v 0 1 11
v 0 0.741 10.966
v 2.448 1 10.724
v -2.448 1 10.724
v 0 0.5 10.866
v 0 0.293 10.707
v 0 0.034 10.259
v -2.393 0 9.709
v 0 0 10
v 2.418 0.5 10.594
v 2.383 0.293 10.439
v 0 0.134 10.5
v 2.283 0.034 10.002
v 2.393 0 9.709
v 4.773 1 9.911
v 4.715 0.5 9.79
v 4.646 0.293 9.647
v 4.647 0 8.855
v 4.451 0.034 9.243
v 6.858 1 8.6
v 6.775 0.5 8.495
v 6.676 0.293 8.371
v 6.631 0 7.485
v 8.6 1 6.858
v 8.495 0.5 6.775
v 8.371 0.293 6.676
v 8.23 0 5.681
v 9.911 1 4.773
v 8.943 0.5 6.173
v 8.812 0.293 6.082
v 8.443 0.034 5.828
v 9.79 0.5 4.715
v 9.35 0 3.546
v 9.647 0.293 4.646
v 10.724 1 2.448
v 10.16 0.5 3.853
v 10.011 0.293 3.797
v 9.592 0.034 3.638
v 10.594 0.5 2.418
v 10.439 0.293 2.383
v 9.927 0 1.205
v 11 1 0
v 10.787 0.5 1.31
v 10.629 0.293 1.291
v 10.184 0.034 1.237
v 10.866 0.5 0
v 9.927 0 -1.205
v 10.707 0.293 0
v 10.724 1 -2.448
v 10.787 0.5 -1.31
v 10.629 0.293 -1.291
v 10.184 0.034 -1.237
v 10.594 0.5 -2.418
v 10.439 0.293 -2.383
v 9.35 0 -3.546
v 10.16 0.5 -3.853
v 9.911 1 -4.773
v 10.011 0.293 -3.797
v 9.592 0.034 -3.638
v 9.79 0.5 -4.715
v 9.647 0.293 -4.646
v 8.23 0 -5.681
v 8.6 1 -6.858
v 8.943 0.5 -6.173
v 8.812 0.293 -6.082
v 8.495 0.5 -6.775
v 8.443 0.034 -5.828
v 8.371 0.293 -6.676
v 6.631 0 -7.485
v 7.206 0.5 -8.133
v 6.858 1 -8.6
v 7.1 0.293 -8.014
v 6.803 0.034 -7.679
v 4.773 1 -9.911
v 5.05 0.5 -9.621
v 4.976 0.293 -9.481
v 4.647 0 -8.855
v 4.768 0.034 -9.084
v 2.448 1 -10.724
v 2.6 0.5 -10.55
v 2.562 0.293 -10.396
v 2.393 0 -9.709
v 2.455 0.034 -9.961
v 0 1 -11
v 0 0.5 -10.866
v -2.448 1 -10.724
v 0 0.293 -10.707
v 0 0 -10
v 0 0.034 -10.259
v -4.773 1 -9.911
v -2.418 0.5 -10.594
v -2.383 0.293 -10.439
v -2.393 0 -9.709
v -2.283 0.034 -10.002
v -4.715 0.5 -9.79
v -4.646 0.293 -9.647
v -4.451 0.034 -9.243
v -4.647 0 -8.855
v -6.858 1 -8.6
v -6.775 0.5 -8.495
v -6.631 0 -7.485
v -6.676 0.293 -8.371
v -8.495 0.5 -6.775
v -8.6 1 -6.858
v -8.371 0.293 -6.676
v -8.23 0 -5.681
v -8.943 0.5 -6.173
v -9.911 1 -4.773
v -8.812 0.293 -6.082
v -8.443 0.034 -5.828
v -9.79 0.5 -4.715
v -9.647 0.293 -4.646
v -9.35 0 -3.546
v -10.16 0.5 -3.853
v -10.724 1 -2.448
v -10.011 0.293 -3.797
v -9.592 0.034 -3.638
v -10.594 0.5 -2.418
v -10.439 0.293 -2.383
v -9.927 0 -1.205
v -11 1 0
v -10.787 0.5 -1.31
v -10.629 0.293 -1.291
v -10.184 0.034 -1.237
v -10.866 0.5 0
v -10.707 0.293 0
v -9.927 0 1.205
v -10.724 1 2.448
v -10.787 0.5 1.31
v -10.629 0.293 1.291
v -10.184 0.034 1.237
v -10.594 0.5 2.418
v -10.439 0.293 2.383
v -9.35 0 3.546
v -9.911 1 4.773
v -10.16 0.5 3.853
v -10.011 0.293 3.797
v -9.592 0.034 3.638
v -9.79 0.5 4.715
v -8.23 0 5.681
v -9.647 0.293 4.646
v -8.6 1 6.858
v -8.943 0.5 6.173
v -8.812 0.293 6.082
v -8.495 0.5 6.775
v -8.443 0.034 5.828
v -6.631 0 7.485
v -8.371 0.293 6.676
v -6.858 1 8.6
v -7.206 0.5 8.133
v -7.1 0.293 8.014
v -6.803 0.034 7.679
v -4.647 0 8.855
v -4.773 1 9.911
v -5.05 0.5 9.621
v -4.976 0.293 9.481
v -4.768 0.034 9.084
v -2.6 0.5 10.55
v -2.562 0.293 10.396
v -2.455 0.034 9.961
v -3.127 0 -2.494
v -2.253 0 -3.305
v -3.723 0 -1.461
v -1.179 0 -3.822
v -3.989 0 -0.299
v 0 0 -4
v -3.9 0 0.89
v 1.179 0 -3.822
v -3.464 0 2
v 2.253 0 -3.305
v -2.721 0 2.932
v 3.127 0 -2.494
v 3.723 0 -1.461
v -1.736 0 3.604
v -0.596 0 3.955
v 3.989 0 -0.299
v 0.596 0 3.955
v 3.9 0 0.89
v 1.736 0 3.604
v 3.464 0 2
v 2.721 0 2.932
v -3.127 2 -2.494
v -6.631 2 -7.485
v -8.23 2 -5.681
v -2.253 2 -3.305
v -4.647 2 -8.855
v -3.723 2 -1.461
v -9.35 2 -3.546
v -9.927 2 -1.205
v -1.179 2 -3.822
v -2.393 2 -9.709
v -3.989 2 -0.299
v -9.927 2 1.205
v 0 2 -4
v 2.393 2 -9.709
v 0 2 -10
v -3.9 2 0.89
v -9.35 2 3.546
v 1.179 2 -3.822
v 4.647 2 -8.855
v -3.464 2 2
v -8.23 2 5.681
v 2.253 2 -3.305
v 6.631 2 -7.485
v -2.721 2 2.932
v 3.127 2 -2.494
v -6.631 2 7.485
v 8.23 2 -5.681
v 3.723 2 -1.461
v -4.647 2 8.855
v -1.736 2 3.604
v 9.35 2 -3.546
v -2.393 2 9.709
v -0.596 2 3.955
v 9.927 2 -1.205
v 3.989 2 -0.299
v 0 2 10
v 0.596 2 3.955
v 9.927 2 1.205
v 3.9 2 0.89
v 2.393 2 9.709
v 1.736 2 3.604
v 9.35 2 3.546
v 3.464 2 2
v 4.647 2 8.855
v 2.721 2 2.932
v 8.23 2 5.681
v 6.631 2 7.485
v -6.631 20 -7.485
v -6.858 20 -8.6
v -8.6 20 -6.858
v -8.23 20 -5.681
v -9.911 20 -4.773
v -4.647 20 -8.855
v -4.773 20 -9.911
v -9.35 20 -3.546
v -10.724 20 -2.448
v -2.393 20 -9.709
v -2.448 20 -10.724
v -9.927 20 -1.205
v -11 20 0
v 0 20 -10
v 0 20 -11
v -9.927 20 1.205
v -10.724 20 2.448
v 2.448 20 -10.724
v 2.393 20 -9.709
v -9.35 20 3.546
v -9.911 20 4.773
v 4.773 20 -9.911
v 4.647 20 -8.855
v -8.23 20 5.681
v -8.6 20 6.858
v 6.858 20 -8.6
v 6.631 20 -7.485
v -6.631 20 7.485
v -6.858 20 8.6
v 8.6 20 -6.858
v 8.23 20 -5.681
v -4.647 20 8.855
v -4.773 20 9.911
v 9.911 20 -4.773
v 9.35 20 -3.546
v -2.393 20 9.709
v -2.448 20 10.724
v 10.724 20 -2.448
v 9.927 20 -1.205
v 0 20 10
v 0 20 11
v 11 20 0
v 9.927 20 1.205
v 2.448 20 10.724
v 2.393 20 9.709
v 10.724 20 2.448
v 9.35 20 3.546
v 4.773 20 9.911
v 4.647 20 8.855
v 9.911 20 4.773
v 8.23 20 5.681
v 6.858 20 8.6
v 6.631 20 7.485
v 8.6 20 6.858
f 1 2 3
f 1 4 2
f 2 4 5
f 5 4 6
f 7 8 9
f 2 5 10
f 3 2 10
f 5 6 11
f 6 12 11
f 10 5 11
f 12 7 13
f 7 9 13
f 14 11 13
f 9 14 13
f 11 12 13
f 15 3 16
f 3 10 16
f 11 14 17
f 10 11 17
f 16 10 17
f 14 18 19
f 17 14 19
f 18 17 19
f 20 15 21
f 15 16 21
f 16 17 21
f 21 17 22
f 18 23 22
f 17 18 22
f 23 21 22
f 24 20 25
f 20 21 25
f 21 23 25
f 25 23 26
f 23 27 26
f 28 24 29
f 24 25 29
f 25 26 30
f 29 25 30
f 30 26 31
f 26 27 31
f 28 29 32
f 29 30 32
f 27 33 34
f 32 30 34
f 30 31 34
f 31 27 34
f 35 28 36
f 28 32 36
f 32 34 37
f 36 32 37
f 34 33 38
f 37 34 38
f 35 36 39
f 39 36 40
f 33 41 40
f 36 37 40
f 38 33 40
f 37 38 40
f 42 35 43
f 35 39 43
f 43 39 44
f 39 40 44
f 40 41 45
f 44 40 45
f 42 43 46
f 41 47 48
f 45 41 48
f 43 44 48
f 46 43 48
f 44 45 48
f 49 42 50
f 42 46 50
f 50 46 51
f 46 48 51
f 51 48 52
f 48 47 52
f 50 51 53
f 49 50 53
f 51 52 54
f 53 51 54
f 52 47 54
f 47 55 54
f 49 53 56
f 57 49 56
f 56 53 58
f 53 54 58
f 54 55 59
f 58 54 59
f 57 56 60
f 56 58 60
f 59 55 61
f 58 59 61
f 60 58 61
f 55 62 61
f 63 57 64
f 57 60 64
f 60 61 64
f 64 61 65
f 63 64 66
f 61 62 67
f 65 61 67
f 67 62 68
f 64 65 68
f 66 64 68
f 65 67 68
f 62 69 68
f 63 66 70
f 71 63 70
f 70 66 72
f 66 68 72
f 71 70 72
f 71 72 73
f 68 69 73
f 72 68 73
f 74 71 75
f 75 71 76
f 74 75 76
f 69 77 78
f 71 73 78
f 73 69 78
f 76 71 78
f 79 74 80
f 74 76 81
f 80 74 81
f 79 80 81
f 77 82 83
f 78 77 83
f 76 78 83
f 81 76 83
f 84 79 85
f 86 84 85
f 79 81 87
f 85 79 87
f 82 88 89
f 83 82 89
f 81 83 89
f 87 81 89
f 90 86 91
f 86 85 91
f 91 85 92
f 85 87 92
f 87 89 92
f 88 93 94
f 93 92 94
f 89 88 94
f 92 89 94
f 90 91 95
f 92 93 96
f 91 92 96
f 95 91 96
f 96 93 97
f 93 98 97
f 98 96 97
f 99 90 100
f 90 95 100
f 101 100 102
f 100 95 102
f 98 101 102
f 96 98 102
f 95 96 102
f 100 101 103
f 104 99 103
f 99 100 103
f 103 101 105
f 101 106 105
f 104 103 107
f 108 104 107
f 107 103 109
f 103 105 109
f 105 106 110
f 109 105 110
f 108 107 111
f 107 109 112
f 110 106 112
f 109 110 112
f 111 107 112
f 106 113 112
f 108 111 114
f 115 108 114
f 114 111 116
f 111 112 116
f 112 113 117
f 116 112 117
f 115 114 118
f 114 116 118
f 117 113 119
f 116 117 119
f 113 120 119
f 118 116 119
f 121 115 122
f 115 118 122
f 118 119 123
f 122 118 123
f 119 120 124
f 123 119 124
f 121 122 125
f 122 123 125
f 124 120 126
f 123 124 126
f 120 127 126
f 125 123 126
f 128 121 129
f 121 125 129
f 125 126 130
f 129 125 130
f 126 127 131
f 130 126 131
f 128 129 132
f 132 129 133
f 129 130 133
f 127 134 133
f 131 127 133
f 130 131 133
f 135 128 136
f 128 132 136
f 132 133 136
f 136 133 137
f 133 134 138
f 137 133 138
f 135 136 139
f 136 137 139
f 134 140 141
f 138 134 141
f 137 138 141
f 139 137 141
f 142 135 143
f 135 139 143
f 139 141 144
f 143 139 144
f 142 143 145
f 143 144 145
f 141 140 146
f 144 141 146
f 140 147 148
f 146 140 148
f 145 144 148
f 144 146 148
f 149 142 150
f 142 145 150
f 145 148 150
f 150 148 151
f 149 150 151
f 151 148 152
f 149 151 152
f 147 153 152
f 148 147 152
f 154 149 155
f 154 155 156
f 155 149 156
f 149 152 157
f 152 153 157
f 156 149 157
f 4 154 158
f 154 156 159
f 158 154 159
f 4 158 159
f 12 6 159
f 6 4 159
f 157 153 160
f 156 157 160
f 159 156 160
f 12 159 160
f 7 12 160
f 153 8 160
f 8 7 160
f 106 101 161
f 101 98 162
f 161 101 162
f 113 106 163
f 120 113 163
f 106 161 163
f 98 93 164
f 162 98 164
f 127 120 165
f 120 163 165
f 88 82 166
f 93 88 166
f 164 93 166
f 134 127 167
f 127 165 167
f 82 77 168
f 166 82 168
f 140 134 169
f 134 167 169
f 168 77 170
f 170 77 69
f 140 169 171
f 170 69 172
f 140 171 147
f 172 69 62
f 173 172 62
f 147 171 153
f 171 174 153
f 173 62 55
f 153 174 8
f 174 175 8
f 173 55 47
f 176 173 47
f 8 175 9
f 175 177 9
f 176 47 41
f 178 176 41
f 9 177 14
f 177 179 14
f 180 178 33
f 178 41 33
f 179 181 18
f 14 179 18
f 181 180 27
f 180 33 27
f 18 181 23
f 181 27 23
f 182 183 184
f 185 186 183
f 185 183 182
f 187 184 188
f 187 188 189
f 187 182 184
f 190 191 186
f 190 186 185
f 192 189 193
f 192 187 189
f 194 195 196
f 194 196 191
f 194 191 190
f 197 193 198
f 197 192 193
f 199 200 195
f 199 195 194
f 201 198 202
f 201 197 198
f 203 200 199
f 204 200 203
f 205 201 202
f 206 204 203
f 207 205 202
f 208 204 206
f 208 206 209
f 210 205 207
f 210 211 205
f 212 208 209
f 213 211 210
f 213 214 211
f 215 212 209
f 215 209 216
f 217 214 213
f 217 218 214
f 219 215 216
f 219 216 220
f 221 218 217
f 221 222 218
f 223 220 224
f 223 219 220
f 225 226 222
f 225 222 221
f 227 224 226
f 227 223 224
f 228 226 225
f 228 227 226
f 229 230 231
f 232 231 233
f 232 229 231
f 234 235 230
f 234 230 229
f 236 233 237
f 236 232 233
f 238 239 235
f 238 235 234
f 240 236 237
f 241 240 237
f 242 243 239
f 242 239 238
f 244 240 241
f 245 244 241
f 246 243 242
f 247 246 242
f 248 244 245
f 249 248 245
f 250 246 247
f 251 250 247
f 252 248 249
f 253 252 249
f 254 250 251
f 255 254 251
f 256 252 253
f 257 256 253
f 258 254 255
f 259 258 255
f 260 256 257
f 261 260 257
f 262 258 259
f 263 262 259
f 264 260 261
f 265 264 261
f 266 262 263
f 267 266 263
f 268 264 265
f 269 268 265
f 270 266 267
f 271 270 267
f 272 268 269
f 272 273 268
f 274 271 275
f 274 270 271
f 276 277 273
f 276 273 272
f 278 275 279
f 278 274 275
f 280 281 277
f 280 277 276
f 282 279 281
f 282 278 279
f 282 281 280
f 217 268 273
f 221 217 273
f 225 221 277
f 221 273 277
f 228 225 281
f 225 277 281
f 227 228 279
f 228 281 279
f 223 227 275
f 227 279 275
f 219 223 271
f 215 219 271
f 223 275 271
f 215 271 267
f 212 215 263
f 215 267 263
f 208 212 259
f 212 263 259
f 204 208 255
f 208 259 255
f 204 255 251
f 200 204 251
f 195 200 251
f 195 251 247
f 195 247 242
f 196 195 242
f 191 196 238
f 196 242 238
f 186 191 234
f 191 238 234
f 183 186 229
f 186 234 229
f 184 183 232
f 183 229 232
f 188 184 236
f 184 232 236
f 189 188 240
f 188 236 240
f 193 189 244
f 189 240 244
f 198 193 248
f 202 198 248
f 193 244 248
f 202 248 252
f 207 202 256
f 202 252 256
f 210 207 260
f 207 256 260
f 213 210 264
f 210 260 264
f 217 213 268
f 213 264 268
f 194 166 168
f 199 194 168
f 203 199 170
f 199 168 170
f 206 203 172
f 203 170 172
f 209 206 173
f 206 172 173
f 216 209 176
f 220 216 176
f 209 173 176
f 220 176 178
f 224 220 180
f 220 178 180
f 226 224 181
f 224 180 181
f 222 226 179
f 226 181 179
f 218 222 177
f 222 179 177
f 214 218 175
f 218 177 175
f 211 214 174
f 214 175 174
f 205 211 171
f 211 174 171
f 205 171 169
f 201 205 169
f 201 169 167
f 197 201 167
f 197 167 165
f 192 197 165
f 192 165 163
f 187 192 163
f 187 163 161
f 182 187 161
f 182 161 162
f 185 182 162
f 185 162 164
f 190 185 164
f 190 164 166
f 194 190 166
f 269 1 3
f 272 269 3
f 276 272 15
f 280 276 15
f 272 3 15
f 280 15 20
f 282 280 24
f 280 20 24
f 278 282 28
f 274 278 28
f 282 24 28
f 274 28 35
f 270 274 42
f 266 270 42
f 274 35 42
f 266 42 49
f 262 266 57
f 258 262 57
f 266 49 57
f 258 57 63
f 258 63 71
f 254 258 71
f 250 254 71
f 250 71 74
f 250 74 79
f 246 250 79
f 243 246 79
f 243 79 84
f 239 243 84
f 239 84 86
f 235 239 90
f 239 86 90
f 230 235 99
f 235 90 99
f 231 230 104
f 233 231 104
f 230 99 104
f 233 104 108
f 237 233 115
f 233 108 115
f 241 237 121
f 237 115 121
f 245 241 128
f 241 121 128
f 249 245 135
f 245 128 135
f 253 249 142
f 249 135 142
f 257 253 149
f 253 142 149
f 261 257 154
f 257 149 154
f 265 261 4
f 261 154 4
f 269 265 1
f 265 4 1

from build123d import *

# Parameters (mm, degrees)
SKETCH1_R           = 11
BOSS_EXTRUDE1_DEPTH = 20
SKETCH2_R           = 10
CUT_EXTRUDE1_DEPTH  = 18
FILLET1_R           = 1
CUT_EXTRUDE2_REACH  = 27.338
SKETCH3_R           = 4


with BuildPart() as part:
    # Sketch1 → Boss-Extrude1 (new body)
    with BuildSketch(Plane(origin=(0, 0, 0), x_dir=(1, 0, 0), z_dir=(0, 1, 0))):
        with Locations(Location((0, 0, 0), (0, 0, 270))):
            Circle(SKETCH1_R)
    extrude(amount=BOSS_EXTRUDE1_DEPTH)

    # Sketch2 → Cut-Extrude1 (cut)
    with BuildSketch(Plane(origin=(0, 20, 0), x_dir=(1, 0, 0), z_dir=(0, 1, 0))):
        with Locations(Location((0, 0, 0), (0, 0, 270))):
            Circle(SKETCH2_R)
    extrude(amount=-CUT_EXTRUDE1_DEPTH, mode=Mode.SUBTRACT)

    # Fillet1
    fillet1_edges = [part.edges().sort_by_distance(p)[0] for p in [
        (0, 0, -11),
    ]]
    fillet(fillet1_edges, radius=FILLET1_R)

    # Sketch3 → Cut-Extrude2 (cut, up to next)
    with BuildSketch(Plane.XZ, mode=Mode.PRIVATE) as cut_extrude2_sk1:
        with Locations(Location((0, 0, 0), (0, 0, 270))):
            Circle(SKETCH3_R)
    cut_extrude2_tool1 = extrude(cut_extrude2_sk1.sketch, amount=-CUT_EXTRUDE2_REACH, mode=Mode.PRIVATE) & part.part
    add(cut_extrude2_tool1.solids().sort_by_distance((0, 0, 0))[0], mode=Mode.SUBTRACT)


solid = part.part
